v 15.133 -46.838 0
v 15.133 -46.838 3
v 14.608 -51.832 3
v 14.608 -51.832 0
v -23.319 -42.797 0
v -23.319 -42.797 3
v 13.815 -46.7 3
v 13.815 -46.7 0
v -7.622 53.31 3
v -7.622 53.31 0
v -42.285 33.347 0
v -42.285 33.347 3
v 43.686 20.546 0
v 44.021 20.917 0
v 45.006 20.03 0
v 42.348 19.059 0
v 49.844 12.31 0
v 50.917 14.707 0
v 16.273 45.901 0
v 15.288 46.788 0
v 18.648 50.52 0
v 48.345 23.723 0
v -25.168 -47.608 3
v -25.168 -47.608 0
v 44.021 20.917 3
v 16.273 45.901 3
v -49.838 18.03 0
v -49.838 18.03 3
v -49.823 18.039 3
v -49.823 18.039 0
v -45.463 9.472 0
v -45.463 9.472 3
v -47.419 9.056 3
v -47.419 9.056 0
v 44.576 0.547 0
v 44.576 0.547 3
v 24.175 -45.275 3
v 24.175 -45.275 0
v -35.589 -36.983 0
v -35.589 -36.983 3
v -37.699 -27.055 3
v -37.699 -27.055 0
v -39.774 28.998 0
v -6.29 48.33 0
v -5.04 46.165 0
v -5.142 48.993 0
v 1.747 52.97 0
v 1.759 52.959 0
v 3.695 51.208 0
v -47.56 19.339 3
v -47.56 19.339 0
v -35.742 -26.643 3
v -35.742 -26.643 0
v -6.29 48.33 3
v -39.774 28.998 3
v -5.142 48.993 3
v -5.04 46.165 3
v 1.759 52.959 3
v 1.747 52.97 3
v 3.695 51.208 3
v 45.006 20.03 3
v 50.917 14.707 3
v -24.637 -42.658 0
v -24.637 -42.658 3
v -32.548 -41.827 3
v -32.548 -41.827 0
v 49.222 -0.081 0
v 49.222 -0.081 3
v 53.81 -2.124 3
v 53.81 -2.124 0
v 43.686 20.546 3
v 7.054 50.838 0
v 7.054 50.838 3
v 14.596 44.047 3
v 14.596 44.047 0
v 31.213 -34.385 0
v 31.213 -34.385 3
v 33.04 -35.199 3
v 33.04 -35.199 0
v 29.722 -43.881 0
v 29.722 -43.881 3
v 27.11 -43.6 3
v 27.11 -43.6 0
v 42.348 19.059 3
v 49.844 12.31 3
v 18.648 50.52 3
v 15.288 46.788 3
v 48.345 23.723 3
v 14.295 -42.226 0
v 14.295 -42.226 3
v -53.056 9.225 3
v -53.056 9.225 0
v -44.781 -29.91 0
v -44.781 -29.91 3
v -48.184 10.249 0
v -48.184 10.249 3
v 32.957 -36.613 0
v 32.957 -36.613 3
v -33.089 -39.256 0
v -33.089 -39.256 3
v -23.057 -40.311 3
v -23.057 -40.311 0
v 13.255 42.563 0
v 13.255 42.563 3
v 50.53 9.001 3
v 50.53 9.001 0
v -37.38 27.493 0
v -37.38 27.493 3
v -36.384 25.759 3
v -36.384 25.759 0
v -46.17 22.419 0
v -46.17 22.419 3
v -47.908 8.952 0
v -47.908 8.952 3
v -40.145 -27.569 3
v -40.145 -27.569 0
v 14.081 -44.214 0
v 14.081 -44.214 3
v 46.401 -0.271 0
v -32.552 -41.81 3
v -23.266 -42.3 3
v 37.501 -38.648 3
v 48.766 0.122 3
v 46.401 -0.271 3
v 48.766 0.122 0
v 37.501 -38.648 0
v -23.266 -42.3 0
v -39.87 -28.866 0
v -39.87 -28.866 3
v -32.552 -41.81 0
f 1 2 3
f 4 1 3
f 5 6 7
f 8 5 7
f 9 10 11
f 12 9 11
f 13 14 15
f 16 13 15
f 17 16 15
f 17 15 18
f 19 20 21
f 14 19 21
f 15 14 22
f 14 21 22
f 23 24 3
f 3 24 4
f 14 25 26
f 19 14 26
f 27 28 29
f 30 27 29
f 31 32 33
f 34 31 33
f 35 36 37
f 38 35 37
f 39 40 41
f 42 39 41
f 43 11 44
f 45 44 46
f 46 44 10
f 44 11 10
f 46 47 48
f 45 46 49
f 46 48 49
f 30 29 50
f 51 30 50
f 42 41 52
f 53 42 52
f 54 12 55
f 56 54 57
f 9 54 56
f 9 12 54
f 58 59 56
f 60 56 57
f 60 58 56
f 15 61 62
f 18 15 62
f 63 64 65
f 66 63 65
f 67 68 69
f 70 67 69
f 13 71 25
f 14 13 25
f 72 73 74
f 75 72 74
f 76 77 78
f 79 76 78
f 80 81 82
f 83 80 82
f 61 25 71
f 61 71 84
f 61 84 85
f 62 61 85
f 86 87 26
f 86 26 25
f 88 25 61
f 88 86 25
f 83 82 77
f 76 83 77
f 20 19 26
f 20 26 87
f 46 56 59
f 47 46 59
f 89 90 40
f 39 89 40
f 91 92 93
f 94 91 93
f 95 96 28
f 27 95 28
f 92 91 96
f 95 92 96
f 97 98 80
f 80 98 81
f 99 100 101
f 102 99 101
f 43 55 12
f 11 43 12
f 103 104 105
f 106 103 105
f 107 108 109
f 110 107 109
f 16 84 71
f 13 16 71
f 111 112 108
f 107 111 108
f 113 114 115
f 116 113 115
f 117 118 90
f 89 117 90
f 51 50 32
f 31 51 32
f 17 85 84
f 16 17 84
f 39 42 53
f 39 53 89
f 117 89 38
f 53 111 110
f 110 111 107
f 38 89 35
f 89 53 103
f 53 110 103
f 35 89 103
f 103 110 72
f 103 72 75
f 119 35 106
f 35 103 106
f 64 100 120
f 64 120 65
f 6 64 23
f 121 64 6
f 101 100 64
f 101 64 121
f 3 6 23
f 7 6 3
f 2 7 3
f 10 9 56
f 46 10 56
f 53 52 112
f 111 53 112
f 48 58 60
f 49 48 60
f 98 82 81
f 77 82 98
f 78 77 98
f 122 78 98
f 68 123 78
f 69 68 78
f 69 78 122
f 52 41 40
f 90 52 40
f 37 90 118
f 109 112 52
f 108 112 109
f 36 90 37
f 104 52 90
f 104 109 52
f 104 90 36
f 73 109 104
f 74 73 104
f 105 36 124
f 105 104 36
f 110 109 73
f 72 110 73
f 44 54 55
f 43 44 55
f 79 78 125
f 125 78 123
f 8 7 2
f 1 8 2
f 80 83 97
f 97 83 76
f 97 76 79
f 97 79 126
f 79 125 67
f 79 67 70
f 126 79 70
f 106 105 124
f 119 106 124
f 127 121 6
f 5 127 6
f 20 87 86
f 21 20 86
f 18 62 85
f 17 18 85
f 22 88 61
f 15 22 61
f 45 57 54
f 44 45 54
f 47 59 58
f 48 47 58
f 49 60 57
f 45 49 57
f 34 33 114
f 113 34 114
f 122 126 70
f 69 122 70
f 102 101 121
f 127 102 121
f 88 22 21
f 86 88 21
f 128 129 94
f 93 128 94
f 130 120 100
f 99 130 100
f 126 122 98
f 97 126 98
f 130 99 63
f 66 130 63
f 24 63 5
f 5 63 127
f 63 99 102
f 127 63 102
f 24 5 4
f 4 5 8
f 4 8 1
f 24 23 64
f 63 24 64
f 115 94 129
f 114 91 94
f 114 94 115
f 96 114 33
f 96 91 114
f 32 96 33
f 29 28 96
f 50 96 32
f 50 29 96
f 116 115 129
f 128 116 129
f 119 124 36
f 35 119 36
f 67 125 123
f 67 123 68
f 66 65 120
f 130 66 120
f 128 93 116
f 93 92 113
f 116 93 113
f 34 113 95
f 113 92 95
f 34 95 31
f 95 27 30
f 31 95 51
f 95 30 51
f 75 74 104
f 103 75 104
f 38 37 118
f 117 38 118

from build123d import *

# Parameters (mm, degrees)
BOSS_EXTRUDE1_DEPTH = 3
CUT_EXTRUDE3_DEPTH  = 10


with BuildPart() as part:
    # Sketch1 → Boss-Extrude1 (new body)
    with BuildSketch(Plane.XY):
        Polygon((-41.404007678, -45.884292091), (30.844012981, -53.556577334), (60.46665605, 12.784506978), (6.526435644, 61.457837175), (-56.433096997, 25.198525272), align=None)
    extrude(amount=BOSS_EXTRUDE1_DEPTH)

    # Sketch4 → Cut-Extrude3 (cut)
    with BuildSketch(Plane.XY.offset(3)):
        Polygon((48.765589151, 0.121903102), (49.22236188, -0.08146522), (53.809748587, -2.123901372), (60.46665605, 12.784506978), (48.345014677, 23.722553737), (45.005827669, 20.030043583), (50.917437936, 14.707205791), (49.84384433, 12.30979199), (42.347693446, 19.059356563), (43.685954659, 20.545646214), (44.020519963, 20.917218627), (16.273265348, 45.900958899), (15.288024352, 46.788073876), (18.648077016, 50.519790415), (6.526435644, 61.457837175), (-7.622058186, 53.309513494), (-5.142137876, 48.99270954), (1.746969728, 52.97013767), (1.75942092, 52.958877889), (3.695287077, 51.20824787), (-5.040368308, 46.164714882), (-6.290368308, 48.329778391), (-39.77384321, 28.998085143), (-42.284603166, 33.346848953), (-56.433096997, 25.198525272), (-53.0557057, 9.224537526), (-48.18384365, 10.249116114), (-49.837751265, 18.030139678), (-49.823194949, 18.038502), (-47.560031319, 19.338645698), (-45.462812376, 9.472006315), (-47.419107578, 9.056182934), (-47.908181378, 8.952227088), (-40.145254927, -27.569470429), (-39.869611319, -28.866271649), (-44.781398973, -29.910304344), (-41.404007678, -45.884292091), (-25.168171234, -47.608435772), (-24.637115209, -42.658407427), (-32.548393933, -41.826898527), (-32.551848825, -41.810470547), (-33.089002938, -39.256307532), (-23.057194965, -40.310693037), (-23.266251892, -42.299736828), (-23.318516123, -42.796997776), (13.814558486, -46.699841186), (15.133068296, -46.838422151), (14.608176536, -51.832433652), (30.844012981, -53.556577334), (37.500920443, -38.648168984), (32.957269066, -36.61346181), (29.721737535, -43.880584612), (27.109902849, -43.600378026), (31.212682203, -34.385384722), (33.039773118, -35.198858009), align=None)
        Polygon((24.175040114, -45.275000985), (14.081237376, -44.214099567), (14.294580487, -42.225506273), (-35.588586477, -36.982574156), (-37.698765855, -27.054960721), (-35.741574597, -26.643352955), (-46.169996168, 22.418513165), (-37.380356008, 27.493214278), (-36.3840884, 25.759008573), (7.053959585, 50.83797727), (14.59643533, 44.046701604), (13.254971316, 42.563295769), (50.529582947, 9.001084707), (46.401449157, -0.270855594), (44.576111193, 0.546554886), align=None, mode=Mode.SUBTRACT)
    extrude(amount=-CUT_EXTRUDE3_DEPTH, mode=Mode.SUBTRACT)


with BuildPart() as cut_extrude3_piece_1:
    # of the separate pieces the step leaves, piece 1, a body of its own (cut_extrude3_pieces)
    add(part.part.solids().sort_by_distance((13.254971316, 42.563295769, 0))[0])


with BuildPart() as cut_extrude3_piece_2:
    # of the separate pieces the step leaves, piece 2, a body of its own (cut_extrude3_pieces)
    add(part.part.solids().sort_by_distance((37.500920444, -38.648168984, 0))[0])


with BuildPart() as cut_extrude3_piece_3:
    # of the separate pieces the step leaves, piece 3, a body of its own (cut_extrude3_pieces)
    add(part.part.solids().sort_by_distance((-25.168171234, -47.608435773, 0))[0])


with BuildPart() as cut_extrude3_piece_4:
    # of the separate pieces the step leaves, piece 4, a body of its own (cut_extrude3_pieces)
    add(part.part.solids().sort_by_distance((-53.055705701, 9.224537526, 0))[0])


with BuildPart() as cut_extrude3_piece_5:
    # of the separate pieces the step leaves, piece 5, a body of its own (cut_extrude3_pieces)
    add(part.part.solids().sort_by_distance((-7.622058186, 53.309513494, 0))[0])


with BuildPart() as cut_extrude3_piece_6:
    # of the separate pieces the step leaves, piece 6, a body of its own (cut_extrude3_pieces)
    add(part.part.solids().sort_by_distance((48.345014677, 23.722553737, 0))[0])


solid = Compound([cut_extrude3_piece_1.part, cut_extrude3_piece_2.part, cut_extrude3_piece_3.part, cut_extrude3_piece_4.part, cut_extrude3_piece_5.part, cut_extrude3_piece_6.part])
